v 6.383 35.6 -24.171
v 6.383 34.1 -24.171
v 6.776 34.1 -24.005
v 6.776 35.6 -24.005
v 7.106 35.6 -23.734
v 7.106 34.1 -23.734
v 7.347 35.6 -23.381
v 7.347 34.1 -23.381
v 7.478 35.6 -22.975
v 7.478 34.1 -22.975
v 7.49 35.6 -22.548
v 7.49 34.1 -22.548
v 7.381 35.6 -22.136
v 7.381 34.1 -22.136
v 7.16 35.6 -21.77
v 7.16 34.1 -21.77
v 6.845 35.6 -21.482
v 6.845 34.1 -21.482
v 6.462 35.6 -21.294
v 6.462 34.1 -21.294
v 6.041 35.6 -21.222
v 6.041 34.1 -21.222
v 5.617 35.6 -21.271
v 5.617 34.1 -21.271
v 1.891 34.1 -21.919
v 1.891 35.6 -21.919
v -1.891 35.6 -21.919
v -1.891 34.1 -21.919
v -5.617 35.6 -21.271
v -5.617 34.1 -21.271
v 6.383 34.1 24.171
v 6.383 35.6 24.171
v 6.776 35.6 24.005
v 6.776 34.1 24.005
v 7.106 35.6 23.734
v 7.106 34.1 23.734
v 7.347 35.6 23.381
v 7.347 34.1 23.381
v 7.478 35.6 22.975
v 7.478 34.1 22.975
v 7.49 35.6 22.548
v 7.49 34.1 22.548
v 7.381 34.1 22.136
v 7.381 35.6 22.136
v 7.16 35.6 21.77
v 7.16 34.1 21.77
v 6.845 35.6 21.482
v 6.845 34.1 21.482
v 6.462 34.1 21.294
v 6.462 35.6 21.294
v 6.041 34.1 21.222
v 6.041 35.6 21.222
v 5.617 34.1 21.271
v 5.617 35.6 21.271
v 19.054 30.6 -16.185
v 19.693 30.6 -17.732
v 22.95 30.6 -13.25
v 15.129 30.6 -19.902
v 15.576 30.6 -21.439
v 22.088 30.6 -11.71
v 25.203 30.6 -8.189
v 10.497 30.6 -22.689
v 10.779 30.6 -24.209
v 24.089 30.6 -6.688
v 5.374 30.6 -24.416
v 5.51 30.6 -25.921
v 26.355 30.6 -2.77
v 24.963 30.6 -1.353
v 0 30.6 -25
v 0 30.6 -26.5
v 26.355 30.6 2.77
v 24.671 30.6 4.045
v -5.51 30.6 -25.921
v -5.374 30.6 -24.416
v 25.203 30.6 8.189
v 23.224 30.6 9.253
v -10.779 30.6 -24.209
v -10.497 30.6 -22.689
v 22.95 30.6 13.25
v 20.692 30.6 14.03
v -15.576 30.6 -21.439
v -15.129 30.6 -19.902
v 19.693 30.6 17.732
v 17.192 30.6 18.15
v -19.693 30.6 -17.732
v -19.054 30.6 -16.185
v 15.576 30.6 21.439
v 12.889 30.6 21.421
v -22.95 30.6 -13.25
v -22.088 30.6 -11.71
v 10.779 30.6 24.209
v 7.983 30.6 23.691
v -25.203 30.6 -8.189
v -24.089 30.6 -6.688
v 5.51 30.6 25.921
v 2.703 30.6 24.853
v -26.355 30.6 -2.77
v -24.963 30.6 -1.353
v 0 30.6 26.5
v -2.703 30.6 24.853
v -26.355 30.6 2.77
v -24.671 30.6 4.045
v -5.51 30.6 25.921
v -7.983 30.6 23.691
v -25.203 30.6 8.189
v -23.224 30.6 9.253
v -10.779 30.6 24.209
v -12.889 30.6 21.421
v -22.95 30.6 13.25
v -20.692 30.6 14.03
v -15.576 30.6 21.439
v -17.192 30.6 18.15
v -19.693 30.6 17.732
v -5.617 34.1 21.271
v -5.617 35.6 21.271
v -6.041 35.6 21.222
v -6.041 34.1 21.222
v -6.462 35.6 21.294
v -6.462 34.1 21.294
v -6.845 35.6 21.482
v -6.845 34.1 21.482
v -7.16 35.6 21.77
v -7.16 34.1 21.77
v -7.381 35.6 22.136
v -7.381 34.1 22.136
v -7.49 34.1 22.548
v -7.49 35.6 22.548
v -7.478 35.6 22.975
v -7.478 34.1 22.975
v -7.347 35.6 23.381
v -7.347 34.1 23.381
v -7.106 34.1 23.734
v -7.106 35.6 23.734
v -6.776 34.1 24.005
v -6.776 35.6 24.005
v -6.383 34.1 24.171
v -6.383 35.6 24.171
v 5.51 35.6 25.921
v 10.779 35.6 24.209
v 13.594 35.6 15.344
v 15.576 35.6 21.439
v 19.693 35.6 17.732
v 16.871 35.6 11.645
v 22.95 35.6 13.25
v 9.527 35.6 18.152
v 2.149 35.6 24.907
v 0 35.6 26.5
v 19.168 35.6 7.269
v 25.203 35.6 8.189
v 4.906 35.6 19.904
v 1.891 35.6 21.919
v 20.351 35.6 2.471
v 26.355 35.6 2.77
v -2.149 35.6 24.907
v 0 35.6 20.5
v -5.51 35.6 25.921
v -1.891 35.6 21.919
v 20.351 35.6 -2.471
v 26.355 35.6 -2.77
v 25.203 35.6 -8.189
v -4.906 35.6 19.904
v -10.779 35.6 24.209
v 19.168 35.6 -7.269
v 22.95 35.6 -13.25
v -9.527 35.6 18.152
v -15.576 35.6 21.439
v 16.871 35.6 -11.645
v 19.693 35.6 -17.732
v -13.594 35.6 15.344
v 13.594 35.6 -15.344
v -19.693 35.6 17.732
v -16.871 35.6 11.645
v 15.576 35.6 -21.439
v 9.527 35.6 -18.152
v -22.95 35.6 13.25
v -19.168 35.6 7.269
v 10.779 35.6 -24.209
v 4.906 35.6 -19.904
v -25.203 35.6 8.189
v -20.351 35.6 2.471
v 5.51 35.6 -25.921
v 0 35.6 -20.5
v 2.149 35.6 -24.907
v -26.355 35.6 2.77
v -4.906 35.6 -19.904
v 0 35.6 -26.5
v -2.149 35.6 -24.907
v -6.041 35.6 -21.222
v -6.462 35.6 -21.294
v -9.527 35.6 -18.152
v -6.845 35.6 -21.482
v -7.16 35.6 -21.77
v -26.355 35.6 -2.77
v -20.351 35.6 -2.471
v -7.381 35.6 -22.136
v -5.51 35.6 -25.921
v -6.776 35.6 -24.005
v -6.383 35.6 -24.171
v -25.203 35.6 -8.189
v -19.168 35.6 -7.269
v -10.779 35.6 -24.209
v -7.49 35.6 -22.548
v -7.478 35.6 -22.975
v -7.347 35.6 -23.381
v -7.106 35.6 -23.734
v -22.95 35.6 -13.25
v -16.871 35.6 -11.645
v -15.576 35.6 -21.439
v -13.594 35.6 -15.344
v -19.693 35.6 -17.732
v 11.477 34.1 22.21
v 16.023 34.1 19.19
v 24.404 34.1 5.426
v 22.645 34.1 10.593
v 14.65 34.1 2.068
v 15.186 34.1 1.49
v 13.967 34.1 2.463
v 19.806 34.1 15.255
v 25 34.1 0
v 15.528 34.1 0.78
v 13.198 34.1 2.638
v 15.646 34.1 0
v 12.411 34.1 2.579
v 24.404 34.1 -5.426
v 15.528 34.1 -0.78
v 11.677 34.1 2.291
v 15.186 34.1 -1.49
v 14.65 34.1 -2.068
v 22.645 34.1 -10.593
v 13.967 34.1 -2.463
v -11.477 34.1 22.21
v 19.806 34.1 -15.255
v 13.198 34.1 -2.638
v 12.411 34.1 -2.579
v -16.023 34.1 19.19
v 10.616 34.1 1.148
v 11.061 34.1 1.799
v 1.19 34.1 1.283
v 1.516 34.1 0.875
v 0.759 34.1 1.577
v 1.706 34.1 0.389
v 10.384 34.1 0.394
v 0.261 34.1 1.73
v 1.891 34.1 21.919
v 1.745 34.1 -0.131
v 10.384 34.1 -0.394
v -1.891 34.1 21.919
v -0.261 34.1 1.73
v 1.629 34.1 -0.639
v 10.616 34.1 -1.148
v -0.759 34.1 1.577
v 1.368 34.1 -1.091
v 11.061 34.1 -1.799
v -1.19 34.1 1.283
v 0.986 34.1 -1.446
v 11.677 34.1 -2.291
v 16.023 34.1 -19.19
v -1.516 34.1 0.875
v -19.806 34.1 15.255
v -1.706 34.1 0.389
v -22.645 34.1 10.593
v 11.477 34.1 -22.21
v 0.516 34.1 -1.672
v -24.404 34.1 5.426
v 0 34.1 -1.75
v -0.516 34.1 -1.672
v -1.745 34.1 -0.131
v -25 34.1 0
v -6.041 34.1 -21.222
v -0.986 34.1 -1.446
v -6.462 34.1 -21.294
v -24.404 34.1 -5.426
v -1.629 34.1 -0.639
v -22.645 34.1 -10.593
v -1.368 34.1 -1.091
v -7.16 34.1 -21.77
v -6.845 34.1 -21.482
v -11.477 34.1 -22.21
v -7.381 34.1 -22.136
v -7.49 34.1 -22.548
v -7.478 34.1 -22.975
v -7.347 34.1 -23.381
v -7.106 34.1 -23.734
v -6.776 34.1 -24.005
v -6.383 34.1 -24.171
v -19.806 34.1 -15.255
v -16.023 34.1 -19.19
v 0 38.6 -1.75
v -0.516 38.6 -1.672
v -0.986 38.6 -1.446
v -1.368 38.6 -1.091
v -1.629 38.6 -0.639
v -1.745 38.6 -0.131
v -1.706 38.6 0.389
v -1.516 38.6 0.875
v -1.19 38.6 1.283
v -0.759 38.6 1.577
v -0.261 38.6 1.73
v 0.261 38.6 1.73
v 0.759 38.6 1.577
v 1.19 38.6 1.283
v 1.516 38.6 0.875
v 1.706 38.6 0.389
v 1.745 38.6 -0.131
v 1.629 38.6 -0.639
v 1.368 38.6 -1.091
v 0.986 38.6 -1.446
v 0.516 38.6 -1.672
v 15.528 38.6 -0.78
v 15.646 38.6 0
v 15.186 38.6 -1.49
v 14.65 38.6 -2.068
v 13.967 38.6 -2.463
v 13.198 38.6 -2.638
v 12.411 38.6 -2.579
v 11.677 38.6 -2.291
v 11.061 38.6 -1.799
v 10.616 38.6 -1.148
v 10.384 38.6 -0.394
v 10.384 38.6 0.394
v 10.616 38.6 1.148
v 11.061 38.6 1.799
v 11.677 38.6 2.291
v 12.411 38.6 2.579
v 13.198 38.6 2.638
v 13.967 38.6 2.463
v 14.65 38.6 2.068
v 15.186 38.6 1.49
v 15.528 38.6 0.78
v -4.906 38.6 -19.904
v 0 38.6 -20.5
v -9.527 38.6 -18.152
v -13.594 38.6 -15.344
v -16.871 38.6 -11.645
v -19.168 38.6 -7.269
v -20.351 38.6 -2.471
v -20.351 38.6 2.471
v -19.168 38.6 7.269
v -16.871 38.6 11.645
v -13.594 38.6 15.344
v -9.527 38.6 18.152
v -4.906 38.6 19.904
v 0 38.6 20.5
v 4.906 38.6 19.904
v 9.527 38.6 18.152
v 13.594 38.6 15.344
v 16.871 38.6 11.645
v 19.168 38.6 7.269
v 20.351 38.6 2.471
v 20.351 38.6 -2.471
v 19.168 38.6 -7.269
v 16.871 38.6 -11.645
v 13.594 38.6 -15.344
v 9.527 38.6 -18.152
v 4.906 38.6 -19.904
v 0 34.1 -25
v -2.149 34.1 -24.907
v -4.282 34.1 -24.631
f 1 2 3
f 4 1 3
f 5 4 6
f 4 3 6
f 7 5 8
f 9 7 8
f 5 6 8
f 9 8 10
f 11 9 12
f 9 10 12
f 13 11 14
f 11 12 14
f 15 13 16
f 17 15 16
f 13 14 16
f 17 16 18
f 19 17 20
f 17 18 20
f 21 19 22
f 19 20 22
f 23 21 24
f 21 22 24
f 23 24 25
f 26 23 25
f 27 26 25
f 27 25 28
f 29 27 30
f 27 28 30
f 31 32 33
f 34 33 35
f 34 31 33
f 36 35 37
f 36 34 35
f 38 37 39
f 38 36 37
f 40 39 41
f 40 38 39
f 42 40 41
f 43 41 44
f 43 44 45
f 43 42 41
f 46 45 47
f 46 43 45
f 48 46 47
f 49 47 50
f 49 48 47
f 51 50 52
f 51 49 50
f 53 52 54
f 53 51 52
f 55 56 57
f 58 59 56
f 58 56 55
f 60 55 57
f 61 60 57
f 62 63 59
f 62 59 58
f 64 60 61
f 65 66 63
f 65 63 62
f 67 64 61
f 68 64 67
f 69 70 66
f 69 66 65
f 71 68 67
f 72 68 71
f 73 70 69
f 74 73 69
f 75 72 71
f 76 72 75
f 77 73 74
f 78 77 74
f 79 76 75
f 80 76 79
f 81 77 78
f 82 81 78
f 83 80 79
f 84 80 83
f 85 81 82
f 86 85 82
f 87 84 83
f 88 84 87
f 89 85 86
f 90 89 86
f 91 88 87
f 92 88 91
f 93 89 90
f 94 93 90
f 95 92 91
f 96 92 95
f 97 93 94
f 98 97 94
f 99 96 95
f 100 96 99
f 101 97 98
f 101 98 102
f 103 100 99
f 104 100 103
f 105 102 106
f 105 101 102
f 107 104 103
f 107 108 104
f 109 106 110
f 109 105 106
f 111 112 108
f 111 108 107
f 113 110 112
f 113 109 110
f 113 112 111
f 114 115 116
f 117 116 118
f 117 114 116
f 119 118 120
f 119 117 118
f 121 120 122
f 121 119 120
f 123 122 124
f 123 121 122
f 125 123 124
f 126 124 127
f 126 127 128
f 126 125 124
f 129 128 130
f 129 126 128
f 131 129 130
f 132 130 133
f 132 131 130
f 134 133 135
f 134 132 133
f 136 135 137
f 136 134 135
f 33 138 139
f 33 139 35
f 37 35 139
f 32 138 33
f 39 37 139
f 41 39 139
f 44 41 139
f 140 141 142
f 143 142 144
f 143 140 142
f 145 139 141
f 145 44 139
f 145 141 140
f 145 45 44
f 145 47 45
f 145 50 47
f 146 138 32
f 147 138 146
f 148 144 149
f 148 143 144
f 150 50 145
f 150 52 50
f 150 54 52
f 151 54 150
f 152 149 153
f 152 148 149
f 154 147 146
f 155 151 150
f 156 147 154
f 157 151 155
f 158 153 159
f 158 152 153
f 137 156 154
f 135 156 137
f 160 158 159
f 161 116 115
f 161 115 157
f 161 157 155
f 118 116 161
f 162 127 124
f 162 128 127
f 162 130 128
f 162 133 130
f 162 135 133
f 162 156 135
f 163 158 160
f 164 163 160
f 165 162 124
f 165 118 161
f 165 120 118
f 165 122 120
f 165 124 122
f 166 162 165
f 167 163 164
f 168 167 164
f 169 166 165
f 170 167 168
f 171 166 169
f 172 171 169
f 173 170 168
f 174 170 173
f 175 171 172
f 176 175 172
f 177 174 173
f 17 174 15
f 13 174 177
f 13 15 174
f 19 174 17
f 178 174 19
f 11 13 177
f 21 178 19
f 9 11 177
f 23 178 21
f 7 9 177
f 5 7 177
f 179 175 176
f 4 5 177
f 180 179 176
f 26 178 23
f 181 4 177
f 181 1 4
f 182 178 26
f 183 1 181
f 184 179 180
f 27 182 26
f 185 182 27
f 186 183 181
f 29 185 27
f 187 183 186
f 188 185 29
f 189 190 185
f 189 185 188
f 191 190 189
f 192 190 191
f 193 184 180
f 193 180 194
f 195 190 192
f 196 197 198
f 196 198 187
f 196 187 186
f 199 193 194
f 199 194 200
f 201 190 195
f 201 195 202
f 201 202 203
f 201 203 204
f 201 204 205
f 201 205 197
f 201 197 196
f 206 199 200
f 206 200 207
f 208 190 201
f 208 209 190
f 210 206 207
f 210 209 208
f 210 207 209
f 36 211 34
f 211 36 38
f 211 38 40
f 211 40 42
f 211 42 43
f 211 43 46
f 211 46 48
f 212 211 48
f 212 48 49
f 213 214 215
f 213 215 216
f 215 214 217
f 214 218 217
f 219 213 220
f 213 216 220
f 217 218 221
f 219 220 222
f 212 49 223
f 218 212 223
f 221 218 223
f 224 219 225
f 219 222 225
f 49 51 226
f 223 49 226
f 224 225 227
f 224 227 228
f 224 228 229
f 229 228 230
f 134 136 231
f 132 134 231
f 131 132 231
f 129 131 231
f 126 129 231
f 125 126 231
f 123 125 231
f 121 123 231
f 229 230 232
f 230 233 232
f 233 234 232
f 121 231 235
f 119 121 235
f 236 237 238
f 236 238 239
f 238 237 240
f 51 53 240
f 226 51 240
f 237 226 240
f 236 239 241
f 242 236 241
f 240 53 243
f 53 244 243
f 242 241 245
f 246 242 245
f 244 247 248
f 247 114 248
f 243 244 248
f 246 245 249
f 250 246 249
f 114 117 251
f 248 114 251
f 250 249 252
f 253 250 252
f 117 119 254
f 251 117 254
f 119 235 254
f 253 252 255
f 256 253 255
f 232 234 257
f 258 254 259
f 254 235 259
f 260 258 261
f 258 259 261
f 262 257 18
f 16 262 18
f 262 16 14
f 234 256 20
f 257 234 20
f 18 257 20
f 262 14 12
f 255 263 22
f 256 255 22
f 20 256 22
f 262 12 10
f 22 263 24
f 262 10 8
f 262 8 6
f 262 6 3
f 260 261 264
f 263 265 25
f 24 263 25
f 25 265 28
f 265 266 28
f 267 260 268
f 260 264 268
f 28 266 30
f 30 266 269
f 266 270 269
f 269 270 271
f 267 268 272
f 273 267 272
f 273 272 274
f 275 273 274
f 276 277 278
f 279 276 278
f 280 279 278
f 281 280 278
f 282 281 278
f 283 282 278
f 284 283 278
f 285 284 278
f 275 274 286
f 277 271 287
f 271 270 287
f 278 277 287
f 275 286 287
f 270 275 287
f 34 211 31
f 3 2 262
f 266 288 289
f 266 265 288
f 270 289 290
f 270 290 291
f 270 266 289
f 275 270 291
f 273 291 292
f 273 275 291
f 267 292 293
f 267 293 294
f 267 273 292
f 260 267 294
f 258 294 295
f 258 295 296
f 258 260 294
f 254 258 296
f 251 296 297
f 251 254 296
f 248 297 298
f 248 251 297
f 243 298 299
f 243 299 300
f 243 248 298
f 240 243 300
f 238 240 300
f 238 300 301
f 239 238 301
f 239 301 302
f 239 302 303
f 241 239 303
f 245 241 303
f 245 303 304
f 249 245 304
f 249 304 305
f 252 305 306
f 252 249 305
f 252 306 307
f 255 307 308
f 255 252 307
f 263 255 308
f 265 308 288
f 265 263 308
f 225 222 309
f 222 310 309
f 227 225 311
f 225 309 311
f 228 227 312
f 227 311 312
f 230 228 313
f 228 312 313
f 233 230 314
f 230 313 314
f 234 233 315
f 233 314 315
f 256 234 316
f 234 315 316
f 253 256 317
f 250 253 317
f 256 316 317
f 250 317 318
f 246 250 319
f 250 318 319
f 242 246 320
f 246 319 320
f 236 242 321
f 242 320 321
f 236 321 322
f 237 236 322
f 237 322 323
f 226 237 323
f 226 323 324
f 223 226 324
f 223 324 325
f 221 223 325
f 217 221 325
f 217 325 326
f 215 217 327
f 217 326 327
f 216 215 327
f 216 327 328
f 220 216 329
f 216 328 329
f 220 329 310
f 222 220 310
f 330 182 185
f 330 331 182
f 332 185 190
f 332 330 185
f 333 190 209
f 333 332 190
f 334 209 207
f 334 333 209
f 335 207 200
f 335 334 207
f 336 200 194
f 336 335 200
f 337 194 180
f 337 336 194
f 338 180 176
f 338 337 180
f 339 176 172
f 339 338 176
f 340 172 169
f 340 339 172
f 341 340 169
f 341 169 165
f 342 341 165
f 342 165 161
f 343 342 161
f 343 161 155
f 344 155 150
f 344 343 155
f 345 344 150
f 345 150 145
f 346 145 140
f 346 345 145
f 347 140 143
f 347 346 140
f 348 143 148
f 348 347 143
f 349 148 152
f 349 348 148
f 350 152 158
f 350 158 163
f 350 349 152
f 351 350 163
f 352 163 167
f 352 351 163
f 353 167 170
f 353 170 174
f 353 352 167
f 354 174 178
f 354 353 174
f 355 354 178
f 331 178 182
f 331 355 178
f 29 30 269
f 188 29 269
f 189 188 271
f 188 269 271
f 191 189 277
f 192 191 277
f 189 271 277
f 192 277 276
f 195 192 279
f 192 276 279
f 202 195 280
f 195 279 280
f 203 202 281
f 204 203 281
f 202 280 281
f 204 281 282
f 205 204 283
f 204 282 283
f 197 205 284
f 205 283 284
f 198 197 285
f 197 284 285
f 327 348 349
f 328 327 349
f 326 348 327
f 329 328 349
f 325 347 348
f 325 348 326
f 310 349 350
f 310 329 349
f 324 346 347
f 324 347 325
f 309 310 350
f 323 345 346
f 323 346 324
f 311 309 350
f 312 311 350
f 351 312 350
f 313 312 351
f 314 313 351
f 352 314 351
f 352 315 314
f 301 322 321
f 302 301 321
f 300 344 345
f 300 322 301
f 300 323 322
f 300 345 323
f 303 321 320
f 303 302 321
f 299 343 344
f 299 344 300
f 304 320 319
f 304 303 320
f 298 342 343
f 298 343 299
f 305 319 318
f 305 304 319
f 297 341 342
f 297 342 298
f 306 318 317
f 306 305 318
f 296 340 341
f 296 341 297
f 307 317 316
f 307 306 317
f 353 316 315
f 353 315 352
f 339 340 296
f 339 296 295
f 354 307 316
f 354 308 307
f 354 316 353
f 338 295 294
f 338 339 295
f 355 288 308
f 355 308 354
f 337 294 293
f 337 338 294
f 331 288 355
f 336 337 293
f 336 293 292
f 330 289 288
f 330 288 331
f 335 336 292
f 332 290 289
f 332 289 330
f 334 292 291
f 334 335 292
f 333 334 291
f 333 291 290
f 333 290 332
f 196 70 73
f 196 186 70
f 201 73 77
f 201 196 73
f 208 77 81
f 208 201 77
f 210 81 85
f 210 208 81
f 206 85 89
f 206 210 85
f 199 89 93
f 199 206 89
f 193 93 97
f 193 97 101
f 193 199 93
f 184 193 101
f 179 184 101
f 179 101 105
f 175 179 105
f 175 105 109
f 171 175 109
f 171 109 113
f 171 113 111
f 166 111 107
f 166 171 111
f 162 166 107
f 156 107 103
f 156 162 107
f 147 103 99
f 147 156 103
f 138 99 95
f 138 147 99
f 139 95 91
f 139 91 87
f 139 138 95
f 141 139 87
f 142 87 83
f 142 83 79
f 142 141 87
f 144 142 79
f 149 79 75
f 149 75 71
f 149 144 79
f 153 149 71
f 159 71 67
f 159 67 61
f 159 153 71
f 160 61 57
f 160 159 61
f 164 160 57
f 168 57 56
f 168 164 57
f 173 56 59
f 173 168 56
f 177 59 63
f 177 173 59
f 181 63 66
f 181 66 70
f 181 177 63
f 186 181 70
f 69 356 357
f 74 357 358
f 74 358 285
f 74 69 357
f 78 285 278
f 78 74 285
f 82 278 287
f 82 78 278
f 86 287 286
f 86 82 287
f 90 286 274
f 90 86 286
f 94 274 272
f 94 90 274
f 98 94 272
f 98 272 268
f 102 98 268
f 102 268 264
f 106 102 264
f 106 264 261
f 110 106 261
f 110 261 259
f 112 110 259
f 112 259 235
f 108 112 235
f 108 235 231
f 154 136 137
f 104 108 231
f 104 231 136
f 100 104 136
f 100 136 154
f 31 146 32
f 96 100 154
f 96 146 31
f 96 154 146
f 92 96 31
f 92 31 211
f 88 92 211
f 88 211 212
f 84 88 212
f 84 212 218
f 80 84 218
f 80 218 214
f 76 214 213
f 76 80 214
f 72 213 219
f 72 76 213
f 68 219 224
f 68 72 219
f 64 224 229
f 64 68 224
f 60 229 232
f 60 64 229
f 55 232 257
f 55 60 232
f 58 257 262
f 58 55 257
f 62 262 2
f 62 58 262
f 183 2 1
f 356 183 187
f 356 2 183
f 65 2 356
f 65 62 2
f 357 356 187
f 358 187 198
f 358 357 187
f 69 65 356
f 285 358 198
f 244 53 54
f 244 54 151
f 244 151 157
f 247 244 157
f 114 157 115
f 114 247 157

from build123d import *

# Parameters (mm, degrees)
SKETCH_3_W          = 2.645592797
SKETCH_3_H          = 5.492550126
CUT_EXTRUDE_START   = -20
CUT_EXTRUDE_2_DEPTH = 20
CUT_EXTRUDE_START_2 = -10
CUT_EXTRUDE_1_DEPTH = 10


with BuildPart() as part:
    # Эскиз1 → Повернуть1 (revolve)
    with BuildSketch(Plane.XY, mode=Mode.PRIVATE) as revolve_1_sk:
        Polygon((-26.5, 30.6), (-26.5, 35.6), (-20.5, 35.6), (-20.5, 38.6), (-1.75, 38.6), (-1.75, 34.1), (-24.523884272, 34.1), (-25, 34.1), (-25, 30.6), align=None)
    revolve(revolve_1_sk.sketch.rotate(Axis((0, 29.900525332, 0), (0, 1, 0)), 270), axis=Axis((0, 29.900525332, 0), (0, 1, 0)))

    # Эскиз3 → Вырез-Повернуть1 (revolve, cut)
    with BuildSketch(Plane.XY, mode=Mode.PRIVATE) as cut_revolve_1_sk:
        with Locations((11.677203602, 35.853724937)):
            Rectangle(SKETCH_3_W, SKETCH_3_H)
    revolve(cut_revolve_1_sk.sketch.rotate(Axis((13, 30.6, 0), (0, 1, 0)), 180), axis=Axis((13, 30.6, 0), (0, 1, 0)), mode=Mode.SUBTRACT)

    # Эскиз5 → Вырез-Вытянуть2 (cut)
    with BuildSketch(Plane(origin=(0, 35.6, 0), x_dir=(1, 0, 0), z_dir=(0, 1, 0)).offset(CUT_EXTRUDE_START)):
        with BuildLine():
            ThreePointArc((-5.617021277, -21.270850288), (-7.450285247, -22.338156812), (-6.382978723, -24.171420782))
            ThreePointArc((-6.382978723, -24.171420782), (0, -25), (6.382978723, -24.171420782))
            ThreePointArc((6.382978723, -24.171420782), (7.450285247, -22.338156812), (5.617021277, -21.270850288))
            ThreePointArc((5.617021277, -21.270850288), (0, -22), (-5.617021277, -21.270850288))
        make_face()
        with BuildLine():
            ThreePointArc((6.382978723, 24.171420782), (7.450285247, 22.338156812), (5.617021277, 21.270850288))
            ThreePointArc((5.617021277, 21.270850288), (0, 22), (-5.617021277, 21.270850288))
            ThreePointArc((-5.617021277, 21.270850288), (-7.450285247, 22.338156812), (-6.382978723, 24.171420782))
            ThreePointArc((-6.382978723, 24.171420782), (0, 25), (6.382978723, 24.171420782))
        make_face()
    extrude(amount=CUT_EXTRUDE_2_DEPTH, mode=Mode.SUBTRACT)

    # Эскиз4 → Вырез-Вытянуть1 (cut)
    with BuildSketch(Plane(origin=(0, 35.6, 0), x_dir=(1, 0, 0), z_dir=(0, 1, 0)).offset(CUT_EXTRUDE_START_2)):
        with BuildLine():
            ThreePointArc((-5.617021277, -21.270850288), (0, -22), (5.617021277, -21.270850288))
            ThreePointArc((5.617021277, -21.270850288), (7.450285247, -22.338156812), (6.382978723, -24.171420782))
            ThreePointArc((6.382978723, -24.171420782), (0, -25), (-6.382978723, -24.171420782))
            ThreePointArc((-6.382978723, -24.171420782), (-7.450285247, -22.338156812), (-5.617021277, -21.270850288))
        make_face()
        with BuildLine():
            ThreePointArc((6.382978723, 24.171420782), (7.450285247, 22.338156812), (5.617021277, 21.270850288))
            ThreePointArc((5.617021277, 21.270850288), (0, 22), (-5.617021277, 21.270850288))
            ThreePointArc((-5.617021277, 21.270850288), (-7.450285247, 22.338156812), (-6.382978723, 24.171420782))
            ThreePointArc((-6.382978723, 24.171420782), (0, 25), (6.382978723, 24.171420782))
        make_face()
    extrude(amount=CUT_EXTRUDE_1_DEPTH, mode=Mode.SUBTRACT)


solid = part.part
